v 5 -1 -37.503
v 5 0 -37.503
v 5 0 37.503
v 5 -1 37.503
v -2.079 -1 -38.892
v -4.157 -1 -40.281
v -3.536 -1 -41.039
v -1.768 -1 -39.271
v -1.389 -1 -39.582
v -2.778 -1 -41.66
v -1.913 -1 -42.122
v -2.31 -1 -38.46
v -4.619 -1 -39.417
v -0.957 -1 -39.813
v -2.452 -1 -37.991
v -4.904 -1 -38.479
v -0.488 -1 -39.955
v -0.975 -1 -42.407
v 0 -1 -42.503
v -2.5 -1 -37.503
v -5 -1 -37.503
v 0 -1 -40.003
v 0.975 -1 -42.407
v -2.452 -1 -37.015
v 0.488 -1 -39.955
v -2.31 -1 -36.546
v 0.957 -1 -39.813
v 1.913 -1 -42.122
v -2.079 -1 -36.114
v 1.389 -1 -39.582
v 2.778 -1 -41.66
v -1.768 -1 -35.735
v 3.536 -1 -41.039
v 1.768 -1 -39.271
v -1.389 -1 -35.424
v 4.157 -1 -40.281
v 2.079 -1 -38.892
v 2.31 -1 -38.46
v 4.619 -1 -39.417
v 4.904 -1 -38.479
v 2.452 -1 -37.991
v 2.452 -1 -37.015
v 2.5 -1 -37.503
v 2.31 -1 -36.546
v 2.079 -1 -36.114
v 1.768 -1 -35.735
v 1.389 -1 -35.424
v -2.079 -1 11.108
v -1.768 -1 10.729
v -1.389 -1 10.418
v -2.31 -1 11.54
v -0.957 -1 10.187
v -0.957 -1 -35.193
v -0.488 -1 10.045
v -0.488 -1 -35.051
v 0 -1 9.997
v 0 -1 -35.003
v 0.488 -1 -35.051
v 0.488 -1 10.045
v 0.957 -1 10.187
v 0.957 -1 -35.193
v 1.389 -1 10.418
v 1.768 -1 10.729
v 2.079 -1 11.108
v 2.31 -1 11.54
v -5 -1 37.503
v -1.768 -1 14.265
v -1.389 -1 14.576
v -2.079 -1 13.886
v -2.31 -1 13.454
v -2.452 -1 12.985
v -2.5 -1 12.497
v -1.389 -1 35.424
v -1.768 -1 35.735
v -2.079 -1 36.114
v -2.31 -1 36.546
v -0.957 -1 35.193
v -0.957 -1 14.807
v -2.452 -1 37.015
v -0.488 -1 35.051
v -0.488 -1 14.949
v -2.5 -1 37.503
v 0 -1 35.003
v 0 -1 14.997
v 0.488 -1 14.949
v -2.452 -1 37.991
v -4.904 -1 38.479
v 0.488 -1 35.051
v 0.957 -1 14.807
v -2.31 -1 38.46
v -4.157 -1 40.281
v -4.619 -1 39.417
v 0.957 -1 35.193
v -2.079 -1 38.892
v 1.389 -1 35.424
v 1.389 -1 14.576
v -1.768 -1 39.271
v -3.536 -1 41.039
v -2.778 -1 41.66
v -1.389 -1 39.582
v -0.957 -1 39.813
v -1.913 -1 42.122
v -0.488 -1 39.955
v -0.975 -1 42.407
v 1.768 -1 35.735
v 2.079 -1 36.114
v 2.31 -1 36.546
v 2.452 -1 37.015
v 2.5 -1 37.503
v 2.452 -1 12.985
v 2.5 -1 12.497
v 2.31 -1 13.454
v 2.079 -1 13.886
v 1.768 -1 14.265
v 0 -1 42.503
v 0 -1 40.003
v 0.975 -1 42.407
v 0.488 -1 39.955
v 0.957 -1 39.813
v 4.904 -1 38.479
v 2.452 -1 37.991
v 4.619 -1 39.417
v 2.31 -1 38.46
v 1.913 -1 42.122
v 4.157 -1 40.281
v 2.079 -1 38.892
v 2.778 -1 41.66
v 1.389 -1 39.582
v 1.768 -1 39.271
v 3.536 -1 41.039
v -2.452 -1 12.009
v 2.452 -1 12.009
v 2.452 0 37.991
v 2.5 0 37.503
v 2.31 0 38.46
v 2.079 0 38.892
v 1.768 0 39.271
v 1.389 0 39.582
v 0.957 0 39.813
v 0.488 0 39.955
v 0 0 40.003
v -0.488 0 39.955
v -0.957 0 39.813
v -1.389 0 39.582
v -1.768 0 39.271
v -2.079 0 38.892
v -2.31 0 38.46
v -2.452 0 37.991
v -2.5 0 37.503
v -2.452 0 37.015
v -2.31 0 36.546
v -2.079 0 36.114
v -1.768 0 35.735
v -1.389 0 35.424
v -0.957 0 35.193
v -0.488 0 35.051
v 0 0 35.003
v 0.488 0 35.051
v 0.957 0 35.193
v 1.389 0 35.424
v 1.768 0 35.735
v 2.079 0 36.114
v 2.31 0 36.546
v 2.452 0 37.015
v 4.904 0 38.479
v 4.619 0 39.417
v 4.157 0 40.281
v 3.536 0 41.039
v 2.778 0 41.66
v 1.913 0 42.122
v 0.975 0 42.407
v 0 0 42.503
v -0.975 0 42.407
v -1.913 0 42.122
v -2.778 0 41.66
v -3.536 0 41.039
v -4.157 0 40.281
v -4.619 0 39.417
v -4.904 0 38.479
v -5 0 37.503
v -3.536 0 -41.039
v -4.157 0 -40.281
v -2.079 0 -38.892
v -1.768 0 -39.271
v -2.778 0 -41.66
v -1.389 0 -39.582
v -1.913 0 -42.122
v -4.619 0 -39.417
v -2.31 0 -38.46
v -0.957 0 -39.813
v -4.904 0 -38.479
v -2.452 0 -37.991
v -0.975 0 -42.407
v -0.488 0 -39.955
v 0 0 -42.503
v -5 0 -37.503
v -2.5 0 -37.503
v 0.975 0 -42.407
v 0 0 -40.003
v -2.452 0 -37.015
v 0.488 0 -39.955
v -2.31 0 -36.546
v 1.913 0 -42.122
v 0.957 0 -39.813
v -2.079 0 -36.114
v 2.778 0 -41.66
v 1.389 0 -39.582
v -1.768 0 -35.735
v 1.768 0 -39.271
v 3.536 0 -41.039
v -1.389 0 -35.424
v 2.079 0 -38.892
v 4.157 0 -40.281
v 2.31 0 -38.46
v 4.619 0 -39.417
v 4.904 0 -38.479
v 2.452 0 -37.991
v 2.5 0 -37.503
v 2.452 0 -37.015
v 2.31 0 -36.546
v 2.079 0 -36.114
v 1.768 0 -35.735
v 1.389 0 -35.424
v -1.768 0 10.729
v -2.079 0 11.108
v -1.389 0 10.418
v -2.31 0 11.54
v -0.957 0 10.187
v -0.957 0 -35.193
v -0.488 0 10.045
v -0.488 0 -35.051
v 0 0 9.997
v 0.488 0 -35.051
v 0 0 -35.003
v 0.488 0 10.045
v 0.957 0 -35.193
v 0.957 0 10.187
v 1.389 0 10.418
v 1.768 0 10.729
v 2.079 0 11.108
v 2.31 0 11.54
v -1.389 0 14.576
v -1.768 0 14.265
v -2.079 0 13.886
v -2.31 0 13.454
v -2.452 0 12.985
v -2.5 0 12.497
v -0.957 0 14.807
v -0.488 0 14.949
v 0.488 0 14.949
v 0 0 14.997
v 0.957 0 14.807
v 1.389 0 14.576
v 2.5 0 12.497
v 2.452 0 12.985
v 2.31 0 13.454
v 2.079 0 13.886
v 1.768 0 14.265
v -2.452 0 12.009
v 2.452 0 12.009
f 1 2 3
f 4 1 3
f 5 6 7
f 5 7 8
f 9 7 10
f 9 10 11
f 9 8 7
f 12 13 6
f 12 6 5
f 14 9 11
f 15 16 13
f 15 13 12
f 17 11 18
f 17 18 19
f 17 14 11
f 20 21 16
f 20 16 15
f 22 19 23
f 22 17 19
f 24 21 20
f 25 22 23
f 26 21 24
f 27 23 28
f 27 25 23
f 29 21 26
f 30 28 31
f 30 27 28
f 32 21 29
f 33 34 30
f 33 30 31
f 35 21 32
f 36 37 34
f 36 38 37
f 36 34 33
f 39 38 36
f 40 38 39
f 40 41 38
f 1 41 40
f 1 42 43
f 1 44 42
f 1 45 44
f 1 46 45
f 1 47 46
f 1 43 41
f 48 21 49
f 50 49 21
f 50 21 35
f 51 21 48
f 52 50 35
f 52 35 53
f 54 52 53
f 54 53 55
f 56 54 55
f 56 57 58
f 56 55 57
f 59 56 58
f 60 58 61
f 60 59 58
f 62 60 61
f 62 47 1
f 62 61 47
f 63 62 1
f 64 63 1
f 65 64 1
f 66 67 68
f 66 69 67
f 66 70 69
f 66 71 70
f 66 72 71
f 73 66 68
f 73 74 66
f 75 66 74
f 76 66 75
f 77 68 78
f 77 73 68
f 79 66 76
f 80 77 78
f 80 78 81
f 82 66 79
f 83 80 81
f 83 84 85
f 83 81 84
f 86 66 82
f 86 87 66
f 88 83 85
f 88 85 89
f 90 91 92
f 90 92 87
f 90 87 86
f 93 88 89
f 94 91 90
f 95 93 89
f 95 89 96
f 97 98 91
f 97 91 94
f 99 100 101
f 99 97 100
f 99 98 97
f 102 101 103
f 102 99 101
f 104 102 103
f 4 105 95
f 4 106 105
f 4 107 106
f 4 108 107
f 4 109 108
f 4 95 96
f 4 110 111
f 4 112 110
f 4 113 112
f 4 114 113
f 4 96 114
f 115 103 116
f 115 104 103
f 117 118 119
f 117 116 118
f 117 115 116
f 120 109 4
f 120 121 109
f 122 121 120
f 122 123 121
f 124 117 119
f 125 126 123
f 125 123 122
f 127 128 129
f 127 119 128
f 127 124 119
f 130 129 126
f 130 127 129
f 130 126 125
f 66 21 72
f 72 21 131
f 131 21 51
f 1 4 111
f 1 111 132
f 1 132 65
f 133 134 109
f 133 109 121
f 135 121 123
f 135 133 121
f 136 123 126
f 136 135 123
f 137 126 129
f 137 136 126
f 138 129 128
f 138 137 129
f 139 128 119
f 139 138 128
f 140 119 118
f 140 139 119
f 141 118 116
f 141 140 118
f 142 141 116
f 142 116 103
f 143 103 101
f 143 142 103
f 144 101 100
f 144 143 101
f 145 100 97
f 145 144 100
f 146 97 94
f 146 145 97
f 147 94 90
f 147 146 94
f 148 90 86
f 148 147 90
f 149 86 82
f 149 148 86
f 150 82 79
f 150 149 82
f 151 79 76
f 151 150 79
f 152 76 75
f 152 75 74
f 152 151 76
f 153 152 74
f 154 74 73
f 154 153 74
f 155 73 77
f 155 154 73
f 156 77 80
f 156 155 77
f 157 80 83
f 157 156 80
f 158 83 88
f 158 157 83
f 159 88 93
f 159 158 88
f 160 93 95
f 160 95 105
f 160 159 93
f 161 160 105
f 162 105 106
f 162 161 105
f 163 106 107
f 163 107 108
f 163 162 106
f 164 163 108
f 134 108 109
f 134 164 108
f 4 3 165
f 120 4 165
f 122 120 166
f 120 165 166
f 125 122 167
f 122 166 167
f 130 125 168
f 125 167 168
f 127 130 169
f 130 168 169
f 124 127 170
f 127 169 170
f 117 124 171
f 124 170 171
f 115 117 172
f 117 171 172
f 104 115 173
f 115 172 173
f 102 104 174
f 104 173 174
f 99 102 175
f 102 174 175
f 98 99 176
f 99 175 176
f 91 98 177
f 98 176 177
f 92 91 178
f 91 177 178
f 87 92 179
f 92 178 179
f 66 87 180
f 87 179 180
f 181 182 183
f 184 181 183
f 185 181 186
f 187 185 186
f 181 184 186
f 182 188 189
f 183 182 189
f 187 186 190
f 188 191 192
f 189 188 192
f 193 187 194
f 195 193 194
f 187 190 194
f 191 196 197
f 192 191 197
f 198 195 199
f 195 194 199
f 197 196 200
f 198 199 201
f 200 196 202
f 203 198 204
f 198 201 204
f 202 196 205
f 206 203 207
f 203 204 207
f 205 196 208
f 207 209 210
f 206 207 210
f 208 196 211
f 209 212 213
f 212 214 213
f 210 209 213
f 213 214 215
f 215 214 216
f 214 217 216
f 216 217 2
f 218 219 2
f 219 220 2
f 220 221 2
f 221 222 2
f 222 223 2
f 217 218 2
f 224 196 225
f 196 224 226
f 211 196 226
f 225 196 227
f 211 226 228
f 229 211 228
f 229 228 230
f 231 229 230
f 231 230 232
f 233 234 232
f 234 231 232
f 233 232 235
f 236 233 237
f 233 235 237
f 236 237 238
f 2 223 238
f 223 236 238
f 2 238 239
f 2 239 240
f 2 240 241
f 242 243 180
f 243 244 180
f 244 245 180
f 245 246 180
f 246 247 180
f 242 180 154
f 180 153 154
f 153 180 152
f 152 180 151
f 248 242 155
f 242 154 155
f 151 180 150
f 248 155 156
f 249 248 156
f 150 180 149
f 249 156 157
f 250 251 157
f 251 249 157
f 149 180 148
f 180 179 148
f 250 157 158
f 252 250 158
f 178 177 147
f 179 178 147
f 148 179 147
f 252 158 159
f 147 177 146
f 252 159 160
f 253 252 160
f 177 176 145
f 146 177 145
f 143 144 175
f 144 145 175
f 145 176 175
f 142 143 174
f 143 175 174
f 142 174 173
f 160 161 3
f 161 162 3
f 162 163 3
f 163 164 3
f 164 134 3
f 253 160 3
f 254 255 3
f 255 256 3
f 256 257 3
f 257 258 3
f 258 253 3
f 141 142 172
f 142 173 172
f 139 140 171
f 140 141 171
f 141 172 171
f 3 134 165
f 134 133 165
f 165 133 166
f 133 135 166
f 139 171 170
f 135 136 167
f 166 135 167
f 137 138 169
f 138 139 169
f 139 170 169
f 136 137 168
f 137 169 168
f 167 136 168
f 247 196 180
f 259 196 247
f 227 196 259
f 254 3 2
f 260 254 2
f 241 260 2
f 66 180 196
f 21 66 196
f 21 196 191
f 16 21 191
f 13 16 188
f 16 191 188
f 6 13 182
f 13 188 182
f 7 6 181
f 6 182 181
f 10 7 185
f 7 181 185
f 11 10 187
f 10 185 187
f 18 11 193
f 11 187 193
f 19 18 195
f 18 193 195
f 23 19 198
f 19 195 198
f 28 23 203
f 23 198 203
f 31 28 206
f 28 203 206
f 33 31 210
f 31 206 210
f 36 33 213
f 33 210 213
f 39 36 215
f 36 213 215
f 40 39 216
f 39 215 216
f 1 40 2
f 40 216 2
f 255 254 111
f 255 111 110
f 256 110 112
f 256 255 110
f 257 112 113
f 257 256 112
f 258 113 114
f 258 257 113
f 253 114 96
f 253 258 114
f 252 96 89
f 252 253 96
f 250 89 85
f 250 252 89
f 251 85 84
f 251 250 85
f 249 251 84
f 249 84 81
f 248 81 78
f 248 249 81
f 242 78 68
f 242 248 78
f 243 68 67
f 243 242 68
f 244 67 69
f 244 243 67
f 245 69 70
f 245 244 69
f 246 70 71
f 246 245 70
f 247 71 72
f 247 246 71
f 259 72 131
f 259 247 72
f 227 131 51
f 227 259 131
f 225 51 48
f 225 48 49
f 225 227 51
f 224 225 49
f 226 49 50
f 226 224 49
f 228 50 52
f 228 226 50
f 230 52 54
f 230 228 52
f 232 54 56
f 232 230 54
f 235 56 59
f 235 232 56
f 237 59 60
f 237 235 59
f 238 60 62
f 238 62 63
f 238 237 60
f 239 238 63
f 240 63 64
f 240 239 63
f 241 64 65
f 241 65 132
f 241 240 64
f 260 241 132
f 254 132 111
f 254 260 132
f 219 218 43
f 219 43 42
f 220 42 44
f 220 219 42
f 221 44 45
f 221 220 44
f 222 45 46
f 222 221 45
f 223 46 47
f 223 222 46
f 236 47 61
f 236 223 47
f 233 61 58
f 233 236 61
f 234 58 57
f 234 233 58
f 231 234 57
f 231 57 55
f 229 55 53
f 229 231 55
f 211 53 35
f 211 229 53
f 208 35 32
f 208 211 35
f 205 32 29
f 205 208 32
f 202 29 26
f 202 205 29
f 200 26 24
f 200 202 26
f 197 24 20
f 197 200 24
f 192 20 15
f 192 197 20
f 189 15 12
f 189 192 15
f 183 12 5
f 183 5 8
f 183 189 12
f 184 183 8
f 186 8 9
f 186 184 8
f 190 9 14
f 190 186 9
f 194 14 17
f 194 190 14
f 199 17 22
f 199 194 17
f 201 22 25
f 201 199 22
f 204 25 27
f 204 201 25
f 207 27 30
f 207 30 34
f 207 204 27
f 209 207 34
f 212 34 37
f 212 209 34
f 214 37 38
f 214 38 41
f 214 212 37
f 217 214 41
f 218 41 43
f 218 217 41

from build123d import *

# Parameters (mm, degrees)
F0_R     = 2.5
F1_DEPTH = 1


with BuildPart() as f1:
    # F0 (on Front) → F1 (new body)
    with BuildSketch(Plane.XZ):
        with BuildLine():
            ThreePointArc((-5, 37.5031), (0, 32.5031), (5, 37.5031))
            ThreePointArc((5, 37.5031), (0, 42.5031), (-5, 37.5031))
        make_face()
        with Locations((0, 37.5031)):
            Circle(F0_R, mode=Mode.SUBTRACT)
        with BuildLine():
            Line((5, -37.5031), (5, 37.5031))
            ThreePointArc((5, 37.5031), (0, 32.5031), (-5, 37.5031))
            Line((-5, 37.5031), (-5, -37.5031))
            ThreePointArc((-5, -37.5031), (0, -32.5031), (5, -37.5031))
        make_face()
        with Locations((0, 12.4969)):
            Circle(F0_R, mode=Mode.SUBTRACT)
        with BuildLine():
            ThreePointArc((-5, -37.5031), (0, -42.5031), (5, -37.5031))
            ThreePointArc((5, -37.5031), (0, -32.5031), (-5, -37.5031))
        make_face()
        with Locations((0, -37.5031)):
            Circle(F0_R, mode=Mode.SUBTRACT)
    extrude(amount=F1_DEPTH)


solid = f1.part
